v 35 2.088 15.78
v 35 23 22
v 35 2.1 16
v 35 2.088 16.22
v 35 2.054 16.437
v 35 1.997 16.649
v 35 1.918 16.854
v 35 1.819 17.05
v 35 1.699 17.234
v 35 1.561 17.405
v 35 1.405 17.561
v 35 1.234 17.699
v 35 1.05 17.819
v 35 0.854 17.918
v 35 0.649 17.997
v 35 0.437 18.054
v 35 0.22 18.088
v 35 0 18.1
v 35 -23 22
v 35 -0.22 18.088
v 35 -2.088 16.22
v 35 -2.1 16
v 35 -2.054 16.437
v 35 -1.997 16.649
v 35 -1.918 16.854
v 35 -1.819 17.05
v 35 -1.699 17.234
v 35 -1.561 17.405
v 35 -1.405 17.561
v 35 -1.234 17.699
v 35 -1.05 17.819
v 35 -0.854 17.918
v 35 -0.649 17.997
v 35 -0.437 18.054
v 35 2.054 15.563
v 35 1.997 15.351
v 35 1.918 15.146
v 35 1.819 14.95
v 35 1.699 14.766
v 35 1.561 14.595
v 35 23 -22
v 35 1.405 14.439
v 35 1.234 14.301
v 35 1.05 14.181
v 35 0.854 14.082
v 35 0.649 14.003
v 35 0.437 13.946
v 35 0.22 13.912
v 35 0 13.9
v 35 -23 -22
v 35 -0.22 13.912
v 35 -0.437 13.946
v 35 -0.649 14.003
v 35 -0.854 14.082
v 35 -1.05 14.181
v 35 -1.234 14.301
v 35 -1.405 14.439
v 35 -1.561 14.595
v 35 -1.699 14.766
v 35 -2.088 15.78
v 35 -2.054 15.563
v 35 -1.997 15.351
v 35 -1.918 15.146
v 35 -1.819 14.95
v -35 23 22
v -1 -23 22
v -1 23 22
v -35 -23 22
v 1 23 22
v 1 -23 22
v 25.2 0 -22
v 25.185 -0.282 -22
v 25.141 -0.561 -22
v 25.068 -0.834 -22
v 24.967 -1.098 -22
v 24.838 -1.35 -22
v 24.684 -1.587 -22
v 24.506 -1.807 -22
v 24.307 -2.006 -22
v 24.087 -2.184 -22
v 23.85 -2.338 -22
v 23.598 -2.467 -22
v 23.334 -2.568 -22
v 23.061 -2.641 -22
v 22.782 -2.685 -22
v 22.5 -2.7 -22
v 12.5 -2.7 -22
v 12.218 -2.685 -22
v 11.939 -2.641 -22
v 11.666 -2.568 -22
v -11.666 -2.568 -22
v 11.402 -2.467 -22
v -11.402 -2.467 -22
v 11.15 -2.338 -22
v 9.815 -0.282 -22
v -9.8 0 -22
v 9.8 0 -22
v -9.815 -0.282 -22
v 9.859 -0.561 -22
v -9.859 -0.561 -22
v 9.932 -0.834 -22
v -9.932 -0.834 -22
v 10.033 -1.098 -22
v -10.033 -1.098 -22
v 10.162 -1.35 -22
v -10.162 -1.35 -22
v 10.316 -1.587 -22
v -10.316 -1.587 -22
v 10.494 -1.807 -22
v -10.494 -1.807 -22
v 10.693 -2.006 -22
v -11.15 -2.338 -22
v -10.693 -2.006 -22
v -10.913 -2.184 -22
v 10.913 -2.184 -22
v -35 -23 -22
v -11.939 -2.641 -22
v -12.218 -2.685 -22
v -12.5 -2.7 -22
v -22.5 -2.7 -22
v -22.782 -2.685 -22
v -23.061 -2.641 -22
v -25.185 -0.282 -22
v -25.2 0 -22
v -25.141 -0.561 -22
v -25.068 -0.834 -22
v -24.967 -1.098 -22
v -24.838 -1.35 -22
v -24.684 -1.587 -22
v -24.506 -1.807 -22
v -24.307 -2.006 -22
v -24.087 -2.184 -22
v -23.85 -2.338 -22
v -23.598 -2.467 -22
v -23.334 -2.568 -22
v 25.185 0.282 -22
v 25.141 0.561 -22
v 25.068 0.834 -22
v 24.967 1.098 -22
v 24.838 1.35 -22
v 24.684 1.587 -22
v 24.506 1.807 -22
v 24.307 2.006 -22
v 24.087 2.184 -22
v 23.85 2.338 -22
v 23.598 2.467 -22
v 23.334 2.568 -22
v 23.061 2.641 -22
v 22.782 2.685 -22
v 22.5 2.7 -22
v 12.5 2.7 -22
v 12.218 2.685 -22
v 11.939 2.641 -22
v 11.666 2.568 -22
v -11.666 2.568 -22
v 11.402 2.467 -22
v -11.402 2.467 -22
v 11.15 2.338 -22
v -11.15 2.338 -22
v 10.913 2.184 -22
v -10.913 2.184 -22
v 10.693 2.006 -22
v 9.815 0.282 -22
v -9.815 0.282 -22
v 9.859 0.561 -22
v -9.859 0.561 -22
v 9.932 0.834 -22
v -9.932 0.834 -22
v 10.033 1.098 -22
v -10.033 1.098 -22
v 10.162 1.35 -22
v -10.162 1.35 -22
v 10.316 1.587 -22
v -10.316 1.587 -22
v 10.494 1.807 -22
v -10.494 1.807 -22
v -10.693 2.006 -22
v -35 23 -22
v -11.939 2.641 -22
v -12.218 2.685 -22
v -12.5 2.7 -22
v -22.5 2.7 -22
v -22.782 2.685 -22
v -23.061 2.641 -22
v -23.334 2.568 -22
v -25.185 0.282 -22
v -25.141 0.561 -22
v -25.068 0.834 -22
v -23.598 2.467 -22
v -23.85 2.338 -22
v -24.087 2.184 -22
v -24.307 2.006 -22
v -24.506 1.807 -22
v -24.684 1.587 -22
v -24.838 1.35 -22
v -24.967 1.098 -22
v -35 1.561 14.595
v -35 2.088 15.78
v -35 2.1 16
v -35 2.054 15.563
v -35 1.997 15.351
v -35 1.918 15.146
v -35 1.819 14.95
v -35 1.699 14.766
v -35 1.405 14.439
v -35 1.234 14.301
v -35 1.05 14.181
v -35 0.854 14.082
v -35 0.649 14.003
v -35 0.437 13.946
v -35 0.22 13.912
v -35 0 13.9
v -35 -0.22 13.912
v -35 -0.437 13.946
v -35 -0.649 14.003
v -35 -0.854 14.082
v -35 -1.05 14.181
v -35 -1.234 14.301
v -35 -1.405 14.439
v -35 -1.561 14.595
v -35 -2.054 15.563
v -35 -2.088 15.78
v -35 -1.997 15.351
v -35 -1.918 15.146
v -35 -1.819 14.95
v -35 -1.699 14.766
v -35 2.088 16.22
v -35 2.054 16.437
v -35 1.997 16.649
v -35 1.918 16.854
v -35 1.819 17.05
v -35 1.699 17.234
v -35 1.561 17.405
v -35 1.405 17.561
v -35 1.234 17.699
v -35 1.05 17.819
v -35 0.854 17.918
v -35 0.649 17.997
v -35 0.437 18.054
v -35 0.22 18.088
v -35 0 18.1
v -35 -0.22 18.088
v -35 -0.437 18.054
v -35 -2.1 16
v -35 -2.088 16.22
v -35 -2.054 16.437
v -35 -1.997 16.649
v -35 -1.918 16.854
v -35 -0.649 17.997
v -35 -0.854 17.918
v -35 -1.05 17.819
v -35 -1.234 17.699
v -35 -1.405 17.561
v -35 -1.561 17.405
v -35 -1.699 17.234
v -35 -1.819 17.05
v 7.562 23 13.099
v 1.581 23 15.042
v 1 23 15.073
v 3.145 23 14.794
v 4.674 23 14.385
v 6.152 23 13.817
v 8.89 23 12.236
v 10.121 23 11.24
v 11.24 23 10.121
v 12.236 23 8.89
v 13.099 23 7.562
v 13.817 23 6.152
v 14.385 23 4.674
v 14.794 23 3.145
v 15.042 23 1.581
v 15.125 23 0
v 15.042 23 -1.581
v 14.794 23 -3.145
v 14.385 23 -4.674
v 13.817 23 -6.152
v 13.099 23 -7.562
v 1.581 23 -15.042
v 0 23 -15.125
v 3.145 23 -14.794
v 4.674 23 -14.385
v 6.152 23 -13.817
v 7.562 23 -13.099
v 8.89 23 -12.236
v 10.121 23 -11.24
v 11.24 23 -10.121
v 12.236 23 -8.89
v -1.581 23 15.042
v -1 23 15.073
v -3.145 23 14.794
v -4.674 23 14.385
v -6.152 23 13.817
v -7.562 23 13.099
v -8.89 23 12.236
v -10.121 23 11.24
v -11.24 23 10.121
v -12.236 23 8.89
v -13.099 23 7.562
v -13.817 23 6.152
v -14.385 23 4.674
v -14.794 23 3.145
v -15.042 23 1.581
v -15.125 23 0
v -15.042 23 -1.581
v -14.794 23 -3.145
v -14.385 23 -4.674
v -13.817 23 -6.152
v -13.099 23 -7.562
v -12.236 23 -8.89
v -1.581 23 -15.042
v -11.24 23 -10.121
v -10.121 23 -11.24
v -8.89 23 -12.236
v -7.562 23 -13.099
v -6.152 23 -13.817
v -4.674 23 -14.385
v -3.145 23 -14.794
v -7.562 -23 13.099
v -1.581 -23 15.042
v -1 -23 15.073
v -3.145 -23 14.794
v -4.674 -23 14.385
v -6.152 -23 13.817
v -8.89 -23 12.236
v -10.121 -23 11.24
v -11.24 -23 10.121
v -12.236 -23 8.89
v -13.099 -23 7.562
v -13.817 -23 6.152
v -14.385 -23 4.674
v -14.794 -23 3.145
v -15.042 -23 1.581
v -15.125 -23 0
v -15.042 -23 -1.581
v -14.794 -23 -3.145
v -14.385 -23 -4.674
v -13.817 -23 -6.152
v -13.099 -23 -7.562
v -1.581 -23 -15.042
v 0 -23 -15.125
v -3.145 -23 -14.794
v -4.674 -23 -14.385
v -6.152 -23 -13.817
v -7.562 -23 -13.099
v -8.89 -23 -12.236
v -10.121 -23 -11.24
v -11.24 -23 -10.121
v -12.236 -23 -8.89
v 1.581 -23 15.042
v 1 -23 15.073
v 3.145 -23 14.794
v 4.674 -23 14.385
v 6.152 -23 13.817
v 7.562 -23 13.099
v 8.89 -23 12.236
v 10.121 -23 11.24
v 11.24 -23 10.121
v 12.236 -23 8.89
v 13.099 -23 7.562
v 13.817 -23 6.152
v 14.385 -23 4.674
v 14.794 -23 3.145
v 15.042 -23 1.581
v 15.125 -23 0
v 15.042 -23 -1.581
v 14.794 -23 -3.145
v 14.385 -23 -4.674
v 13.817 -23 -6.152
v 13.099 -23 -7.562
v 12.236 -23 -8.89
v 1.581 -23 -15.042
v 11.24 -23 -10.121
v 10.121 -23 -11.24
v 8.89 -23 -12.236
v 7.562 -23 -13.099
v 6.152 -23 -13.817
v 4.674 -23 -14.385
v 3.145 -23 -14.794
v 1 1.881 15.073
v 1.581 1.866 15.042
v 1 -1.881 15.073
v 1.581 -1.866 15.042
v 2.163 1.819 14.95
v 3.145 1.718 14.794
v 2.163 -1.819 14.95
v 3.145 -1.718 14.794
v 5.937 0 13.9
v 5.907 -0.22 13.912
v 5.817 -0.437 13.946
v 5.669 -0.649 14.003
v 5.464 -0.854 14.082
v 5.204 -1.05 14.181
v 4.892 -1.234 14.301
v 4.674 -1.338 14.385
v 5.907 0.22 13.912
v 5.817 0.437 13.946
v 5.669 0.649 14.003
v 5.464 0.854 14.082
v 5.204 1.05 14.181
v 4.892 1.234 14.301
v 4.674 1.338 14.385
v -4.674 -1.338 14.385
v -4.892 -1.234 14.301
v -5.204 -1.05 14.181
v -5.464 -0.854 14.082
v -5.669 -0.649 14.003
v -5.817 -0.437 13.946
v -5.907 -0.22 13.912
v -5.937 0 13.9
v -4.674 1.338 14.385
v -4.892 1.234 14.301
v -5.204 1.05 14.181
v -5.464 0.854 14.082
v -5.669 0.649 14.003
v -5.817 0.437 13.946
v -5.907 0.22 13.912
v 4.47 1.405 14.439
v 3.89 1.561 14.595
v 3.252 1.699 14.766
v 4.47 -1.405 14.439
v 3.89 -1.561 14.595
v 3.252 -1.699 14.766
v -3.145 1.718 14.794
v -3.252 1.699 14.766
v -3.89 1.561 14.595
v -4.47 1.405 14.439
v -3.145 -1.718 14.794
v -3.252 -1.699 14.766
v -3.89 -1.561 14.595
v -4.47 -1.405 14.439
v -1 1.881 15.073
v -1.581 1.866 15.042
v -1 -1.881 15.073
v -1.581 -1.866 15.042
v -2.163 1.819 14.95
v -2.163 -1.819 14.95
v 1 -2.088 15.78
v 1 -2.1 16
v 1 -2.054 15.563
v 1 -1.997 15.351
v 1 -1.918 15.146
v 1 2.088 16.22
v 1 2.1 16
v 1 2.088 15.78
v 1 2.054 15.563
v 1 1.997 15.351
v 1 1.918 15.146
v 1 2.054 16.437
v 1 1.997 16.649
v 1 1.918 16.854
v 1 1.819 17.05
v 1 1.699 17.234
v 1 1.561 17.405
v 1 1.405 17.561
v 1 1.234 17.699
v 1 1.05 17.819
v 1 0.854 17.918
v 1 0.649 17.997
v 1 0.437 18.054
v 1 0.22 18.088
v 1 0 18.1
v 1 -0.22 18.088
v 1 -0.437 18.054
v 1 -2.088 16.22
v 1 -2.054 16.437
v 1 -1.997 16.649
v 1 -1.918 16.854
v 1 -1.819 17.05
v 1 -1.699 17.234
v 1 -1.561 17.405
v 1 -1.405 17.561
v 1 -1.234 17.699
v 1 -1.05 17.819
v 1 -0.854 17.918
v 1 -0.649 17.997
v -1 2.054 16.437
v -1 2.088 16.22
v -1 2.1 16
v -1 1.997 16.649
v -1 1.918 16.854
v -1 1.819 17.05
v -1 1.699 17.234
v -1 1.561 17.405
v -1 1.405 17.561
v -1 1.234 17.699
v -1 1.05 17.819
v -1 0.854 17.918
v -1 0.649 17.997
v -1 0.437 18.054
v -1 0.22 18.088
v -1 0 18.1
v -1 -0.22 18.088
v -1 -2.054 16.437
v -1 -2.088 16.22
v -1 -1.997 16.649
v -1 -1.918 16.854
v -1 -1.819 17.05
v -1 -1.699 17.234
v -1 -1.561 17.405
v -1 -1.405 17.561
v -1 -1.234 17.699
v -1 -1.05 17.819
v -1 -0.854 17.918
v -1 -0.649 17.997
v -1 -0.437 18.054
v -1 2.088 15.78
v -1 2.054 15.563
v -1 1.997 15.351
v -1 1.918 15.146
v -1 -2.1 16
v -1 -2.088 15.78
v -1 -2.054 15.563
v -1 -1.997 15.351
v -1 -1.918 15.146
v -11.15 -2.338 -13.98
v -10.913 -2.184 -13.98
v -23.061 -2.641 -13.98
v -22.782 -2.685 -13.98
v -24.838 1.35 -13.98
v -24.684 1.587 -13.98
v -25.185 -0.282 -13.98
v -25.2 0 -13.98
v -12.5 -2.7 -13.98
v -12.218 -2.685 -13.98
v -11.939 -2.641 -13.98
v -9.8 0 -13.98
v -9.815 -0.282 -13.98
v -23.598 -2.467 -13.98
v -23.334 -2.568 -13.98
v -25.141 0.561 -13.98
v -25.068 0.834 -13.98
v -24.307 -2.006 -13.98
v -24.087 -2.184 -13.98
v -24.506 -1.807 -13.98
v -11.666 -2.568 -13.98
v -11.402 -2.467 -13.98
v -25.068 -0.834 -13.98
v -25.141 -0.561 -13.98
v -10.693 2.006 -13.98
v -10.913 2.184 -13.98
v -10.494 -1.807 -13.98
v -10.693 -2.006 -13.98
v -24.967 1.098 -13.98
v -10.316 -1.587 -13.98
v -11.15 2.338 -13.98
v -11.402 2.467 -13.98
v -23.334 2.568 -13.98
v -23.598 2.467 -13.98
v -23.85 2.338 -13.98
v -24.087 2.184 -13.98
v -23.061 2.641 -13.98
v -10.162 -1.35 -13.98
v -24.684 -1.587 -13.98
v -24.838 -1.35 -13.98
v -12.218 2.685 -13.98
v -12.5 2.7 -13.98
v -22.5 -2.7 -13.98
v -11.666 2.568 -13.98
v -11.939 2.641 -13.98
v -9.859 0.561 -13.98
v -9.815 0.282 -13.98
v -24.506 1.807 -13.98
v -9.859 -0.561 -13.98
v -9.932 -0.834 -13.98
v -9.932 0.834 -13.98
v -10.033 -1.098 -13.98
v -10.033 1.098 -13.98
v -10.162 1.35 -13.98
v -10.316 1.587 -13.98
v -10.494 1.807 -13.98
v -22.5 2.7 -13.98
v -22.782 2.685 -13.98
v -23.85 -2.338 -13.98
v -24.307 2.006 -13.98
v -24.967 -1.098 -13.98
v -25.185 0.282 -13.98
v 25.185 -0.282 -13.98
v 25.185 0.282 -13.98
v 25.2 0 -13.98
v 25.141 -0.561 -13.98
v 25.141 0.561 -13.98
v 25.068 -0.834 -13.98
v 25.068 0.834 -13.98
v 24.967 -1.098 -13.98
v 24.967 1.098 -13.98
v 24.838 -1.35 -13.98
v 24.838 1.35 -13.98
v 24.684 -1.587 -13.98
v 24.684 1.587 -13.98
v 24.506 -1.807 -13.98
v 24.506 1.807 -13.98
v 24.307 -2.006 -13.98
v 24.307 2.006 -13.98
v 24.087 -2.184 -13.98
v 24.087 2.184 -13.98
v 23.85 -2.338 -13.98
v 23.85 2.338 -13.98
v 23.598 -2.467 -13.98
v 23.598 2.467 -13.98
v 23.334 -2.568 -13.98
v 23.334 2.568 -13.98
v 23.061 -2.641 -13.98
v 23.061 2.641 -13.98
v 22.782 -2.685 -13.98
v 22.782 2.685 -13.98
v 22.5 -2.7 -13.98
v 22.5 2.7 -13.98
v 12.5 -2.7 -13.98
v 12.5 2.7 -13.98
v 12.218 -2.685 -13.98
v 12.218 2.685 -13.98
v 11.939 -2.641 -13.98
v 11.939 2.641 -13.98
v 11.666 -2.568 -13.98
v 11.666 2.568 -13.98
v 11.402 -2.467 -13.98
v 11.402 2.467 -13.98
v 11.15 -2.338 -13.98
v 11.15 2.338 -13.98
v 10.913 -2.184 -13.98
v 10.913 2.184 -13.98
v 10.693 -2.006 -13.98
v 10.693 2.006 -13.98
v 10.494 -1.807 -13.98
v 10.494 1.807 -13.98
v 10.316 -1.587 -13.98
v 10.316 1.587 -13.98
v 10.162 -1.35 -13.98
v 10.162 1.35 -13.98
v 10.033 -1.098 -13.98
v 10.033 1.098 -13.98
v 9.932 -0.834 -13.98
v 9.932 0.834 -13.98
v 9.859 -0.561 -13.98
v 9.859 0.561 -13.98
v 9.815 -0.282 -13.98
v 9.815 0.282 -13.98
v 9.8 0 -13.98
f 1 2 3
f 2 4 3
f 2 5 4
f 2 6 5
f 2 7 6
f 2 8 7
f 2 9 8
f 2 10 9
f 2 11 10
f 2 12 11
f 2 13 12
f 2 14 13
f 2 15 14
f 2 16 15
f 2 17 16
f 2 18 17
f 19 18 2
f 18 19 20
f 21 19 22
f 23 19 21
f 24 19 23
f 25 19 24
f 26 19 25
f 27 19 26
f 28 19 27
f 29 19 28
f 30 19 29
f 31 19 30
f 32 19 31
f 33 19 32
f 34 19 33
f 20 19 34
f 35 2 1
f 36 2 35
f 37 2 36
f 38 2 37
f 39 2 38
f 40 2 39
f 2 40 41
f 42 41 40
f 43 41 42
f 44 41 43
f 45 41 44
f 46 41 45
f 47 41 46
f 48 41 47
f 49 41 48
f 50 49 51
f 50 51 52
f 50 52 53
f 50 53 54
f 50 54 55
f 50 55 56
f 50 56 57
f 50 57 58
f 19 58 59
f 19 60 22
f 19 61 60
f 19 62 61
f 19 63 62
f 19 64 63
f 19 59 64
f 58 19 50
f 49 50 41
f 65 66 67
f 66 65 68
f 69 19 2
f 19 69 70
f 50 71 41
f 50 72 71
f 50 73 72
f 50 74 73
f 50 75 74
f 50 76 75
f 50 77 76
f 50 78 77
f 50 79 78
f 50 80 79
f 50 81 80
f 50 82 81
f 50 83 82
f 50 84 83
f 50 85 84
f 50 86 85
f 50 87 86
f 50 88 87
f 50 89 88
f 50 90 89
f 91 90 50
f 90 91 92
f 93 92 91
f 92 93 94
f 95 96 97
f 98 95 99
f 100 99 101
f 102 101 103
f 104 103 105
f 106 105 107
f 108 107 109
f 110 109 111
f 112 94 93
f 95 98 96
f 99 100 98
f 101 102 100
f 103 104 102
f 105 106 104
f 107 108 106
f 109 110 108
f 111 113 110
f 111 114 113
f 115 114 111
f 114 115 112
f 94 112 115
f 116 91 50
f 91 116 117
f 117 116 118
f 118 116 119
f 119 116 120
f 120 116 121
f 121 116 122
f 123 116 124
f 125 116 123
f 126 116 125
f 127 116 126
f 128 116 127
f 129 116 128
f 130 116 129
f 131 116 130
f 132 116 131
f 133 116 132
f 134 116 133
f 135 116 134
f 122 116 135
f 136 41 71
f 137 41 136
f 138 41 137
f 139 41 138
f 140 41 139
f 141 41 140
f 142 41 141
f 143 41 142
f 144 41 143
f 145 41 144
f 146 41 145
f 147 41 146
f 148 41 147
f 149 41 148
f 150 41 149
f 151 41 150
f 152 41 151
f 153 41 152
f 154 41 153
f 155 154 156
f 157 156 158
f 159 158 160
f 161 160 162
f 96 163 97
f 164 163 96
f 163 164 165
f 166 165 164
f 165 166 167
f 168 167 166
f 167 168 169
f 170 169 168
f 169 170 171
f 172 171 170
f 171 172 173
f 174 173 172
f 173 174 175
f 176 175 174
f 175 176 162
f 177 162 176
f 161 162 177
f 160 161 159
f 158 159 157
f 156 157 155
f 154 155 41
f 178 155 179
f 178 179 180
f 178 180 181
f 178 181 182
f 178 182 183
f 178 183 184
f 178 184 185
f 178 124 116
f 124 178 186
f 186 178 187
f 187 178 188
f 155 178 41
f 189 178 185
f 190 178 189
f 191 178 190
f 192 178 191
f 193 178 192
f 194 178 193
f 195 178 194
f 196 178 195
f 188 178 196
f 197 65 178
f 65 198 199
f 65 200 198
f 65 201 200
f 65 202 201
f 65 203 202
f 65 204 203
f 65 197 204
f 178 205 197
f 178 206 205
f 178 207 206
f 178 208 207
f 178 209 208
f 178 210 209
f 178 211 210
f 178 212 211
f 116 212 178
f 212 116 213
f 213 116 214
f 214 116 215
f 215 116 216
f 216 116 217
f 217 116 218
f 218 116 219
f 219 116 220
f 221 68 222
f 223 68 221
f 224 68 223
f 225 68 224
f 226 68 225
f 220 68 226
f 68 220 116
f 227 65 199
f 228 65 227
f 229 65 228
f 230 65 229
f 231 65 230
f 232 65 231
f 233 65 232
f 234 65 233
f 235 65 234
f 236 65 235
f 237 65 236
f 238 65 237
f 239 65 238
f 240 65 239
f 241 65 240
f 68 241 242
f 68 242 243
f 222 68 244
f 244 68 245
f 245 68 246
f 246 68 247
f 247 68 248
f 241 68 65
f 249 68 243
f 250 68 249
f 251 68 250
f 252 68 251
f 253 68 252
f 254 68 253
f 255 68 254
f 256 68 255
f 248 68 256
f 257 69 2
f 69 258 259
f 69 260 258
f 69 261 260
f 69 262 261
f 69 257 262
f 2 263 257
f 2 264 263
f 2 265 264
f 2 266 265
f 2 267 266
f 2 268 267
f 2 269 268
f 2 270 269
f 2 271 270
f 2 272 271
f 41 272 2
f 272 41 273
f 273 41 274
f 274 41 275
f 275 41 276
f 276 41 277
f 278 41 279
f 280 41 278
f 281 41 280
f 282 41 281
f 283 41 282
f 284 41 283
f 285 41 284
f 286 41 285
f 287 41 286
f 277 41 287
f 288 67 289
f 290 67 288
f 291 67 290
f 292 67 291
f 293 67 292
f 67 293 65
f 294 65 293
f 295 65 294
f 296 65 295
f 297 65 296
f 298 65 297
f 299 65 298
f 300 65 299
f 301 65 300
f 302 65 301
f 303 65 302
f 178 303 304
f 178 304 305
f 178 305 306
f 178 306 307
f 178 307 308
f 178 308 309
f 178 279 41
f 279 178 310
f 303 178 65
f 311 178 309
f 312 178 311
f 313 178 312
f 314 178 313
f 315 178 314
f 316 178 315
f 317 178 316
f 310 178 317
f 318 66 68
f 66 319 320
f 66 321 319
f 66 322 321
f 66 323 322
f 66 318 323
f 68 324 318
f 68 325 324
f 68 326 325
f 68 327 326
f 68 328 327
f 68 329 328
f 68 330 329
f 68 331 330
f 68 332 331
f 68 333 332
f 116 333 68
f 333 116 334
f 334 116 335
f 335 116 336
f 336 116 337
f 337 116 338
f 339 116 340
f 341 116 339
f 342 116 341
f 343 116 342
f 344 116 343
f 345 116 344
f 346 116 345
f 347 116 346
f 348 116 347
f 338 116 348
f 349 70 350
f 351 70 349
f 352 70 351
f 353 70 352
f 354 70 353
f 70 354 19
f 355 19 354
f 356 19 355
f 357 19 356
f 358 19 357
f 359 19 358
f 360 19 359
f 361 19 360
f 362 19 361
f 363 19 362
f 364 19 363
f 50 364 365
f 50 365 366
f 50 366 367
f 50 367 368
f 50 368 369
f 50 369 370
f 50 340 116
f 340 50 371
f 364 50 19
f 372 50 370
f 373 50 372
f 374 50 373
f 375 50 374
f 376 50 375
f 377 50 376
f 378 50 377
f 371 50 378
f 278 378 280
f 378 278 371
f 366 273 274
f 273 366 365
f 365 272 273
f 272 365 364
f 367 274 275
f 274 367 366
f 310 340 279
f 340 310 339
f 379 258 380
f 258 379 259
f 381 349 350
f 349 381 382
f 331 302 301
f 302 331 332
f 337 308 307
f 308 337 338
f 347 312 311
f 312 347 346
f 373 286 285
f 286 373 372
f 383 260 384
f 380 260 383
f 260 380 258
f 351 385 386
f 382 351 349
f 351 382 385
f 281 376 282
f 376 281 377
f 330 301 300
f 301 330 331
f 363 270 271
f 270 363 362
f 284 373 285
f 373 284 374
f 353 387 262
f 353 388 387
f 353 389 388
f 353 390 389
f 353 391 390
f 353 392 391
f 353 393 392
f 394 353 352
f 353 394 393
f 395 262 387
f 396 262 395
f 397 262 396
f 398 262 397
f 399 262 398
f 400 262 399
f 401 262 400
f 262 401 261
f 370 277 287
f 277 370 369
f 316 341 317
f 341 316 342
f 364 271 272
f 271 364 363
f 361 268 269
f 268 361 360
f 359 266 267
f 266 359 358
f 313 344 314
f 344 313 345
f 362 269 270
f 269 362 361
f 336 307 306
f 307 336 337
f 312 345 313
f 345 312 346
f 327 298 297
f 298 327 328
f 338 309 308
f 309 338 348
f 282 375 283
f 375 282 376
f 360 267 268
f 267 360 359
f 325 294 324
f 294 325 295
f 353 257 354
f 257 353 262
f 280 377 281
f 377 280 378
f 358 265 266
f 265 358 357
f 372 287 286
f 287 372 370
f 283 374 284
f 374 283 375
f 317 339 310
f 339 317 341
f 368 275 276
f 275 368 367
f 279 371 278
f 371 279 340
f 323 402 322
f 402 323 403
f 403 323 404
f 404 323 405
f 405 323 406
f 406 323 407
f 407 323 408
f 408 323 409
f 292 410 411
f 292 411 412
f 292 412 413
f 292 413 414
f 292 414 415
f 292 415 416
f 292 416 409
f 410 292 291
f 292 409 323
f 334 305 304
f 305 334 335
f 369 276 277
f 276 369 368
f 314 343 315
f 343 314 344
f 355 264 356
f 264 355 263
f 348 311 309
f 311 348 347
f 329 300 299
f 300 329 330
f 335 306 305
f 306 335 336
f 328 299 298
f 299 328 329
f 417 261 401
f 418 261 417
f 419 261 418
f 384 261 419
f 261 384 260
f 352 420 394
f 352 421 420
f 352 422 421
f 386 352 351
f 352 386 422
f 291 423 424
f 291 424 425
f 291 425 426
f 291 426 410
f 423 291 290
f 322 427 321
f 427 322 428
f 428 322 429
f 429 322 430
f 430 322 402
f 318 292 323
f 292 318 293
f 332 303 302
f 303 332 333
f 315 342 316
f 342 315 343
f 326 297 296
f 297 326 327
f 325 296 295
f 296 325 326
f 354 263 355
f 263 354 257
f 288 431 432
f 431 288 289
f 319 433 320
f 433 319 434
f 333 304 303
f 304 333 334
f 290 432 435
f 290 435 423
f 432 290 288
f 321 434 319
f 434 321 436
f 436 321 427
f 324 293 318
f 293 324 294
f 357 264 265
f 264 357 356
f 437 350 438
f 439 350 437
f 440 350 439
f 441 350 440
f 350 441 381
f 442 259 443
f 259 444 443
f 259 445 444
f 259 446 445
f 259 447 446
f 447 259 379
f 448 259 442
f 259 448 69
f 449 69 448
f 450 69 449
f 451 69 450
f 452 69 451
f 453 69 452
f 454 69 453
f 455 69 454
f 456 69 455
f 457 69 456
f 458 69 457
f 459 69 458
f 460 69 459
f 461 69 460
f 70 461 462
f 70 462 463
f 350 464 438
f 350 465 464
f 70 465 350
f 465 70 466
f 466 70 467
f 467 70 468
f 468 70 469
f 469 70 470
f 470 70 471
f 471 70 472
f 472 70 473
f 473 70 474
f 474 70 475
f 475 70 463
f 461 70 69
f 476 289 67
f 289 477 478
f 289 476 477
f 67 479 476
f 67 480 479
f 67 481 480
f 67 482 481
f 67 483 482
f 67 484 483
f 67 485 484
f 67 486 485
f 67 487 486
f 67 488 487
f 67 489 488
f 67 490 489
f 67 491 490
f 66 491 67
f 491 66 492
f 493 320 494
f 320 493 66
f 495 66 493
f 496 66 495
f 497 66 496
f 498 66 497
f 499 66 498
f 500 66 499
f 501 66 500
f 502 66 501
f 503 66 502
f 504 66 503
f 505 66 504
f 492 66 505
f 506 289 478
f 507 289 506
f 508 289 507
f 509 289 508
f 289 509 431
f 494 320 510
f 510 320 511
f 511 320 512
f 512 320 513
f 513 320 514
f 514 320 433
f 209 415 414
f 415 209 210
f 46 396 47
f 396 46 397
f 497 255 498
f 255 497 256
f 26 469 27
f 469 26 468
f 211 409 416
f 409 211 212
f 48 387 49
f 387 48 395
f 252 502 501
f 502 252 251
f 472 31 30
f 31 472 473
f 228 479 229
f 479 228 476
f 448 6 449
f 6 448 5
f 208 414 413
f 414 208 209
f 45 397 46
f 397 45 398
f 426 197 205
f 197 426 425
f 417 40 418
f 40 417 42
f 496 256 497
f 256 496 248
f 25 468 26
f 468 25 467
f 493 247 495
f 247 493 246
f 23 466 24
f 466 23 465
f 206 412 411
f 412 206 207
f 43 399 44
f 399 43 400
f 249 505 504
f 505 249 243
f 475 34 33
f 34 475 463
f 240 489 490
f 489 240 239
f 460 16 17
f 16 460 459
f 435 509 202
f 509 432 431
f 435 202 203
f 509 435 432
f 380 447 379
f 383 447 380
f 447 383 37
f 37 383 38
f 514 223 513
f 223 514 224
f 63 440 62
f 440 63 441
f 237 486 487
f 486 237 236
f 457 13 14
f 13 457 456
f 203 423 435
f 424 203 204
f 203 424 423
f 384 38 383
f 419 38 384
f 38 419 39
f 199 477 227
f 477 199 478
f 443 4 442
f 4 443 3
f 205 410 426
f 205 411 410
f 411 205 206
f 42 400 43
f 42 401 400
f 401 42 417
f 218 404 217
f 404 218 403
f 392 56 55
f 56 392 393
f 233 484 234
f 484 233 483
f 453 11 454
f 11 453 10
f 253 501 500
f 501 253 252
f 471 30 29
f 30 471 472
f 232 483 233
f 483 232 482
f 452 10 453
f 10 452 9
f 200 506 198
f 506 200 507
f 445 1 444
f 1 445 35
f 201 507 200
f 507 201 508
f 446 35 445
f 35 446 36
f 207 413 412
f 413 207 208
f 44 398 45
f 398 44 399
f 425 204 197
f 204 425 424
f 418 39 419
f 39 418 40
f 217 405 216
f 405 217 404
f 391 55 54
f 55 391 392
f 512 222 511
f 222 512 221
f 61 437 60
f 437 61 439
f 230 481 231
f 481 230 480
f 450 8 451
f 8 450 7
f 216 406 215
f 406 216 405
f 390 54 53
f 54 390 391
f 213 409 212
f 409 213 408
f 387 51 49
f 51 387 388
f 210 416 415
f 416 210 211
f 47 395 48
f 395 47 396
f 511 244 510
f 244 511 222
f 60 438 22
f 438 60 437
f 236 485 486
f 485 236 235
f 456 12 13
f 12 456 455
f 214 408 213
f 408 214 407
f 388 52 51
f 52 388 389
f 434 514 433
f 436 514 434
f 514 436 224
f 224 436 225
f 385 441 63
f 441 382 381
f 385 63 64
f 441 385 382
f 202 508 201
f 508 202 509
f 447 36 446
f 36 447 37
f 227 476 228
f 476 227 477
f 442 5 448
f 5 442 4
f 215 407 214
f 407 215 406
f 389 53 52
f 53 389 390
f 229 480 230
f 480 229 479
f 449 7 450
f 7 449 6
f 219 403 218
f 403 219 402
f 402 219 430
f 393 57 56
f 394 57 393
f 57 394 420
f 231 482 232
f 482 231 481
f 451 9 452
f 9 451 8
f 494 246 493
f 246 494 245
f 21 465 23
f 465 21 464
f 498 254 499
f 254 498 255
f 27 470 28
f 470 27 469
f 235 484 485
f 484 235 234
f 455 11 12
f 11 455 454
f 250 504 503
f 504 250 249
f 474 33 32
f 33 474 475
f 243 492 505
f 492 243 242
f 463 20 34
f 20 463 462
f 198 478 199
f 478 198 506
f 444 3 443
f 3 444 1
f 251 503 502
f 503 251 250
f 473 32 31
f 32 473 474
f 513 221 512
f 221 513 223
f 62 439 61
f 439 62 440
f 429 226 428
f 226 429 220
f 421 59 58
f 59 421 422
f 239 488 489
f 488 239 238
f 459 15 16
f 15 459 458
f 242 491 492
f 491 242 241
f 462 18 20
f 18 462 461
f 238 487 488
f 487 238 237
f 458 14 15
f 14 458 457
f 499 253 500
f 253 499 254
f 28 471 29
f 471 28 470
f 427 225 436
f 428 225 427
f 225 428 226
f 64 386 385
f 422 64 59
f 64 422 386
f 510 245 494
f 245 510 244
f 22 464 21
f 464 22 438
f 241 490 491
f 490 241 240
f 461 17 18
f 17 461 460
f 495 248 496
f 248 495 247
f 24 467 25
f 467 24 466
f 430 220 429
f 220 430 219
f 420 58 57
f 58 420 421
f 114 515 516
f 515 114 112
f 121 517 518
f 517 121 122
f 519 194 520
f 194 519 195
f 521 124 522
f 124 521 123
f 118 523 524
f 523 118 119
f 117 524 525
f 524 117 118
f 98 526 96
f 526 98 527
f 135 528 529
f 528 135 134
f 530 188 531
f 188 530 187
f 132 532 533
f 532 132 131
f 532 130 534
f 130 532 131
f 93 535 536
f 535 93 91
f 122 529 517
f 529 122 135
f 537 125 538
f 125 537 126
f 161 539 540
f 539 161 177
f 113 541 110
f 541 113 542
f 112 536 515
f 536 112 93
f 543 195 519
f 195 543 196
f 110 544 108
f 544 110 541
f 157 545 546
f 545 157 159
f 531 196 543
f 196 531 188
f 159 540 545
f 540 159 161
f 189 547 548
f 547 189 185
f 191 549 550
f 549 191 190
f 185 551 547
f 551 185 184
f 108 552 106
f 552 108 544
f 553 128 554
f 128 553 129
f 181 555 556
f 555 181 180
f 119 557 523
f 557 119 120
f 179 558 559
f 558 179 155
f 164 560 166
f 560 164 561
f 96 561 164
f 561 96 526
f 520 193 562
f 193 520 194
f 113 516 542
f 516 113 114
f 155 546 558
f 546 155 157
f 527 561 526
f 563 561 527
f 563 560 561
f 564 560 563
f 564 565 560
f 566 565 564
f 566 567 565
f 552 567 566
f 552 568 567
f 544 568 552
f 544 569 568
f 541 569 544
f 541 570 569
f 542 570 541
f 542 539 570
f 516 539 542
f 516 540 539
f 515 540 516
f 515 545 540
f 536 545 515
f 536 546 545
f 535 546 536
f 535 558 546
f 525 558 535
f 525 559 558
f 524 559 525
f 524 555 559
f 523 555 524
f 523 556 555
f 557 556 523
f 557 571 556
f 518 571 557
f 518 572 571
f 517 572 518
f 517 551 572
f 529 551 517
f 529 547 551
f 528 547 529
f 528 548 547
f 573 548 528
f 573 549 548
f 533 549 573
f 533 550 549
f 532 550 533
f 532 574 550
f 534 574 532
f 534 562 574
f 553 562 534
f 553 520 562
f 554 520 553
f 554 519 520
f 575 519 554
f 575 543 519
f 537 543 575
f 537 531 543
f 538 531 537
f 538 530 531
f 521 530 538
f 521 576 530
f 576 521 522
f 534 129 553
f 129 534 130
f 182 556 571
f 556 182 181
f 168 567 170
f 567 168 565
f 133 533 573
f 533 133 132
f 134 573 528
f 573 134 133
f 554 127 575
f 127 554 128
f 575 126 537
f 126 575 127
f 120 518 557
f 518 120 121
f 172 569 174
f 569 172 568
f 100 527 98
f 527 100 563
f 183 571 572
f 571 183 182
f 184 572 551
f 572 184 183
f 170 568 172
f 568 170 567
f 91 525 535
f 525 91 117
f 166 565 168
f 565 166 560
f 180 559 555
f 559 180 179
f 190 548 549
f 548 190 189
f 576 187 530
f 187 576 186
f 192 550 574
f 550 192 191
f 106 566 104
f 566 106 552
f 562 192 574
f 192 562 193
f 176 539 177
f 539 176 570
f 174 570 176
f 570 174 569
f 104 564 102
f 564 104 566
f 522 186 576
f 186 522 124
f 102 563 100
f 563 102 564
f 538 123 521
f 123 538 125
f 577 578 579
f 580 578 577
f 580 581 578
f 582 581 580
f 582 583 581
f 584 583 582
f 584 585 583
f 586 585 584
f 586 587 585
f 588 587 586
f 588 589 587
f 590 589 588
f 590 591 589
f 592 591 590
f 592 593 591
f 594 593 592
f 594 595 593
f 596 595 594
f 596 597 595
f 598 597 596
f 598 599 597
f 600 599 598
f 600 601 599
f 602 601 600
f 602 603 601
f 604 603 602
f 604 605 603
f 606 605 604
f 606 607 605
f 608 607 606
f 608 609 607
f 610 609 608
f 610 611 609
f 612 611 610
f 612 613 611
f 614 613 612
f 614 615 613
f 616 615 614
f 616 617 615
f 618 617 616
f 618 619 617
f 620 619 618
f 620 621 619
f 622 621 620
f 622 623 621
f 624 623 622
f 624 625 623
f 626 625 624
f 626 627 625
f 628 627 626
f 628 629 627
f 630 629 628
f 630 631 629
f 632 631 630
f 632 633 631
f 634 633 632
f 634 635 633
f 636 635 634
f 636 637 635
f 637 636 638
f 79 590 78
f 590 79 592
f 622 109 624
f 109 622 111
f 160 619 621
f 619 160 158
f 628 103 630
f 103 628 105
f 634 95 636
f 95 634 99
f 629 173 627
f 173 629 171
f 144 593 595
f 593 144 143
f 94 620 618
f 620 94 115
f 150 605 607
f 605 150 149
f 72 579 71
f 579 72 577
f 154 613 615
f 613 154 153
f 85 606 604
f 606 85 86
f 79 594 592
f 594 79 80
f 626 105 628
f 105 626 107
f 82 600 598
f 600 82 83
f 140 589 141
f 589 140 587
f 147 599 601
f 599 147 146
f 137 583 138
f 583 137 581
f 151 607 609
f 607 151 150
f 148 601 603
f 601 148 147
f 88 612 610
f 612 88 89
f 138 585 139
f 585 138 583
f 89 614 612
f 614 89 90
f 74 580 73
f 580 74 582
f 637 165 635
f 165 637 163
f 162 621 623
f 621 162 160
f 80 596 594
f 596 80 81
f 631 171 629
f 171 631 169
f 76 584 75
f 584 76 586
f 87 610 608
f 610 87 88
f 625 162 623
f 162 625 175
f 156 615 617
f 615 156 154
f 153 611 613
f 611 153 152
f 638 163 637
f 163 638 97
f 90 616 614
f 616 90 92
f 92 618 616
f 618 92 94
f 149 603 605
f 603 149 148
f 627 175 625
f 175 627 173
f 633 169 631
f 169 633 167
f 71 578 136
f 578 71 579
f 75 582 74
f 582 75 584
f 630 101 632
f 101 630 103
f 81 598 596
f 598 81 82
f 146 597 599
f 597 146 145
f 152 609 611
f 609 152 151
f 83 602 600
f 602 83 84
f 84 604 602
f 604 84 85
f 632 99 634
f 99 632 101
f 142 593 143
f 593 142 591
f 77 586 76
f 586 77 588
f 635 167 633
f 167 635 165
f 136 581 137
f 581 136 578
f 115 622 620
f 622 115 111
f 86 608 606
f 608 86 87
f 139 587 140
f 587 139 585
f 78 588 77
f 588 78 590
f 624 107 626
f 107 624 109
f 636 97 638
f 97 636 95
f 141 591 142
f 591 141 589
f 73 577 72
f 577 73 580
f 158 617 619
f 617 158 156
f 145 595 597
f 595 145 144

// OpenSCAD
// Split housing for 30 mm OD linear bearing.
$fn = 60;
eps = 0.02;
bearing_d = 30;
body_l = 70;
body_d = 46;
body_h = 44;
slot_w = 2;
module mount_slot(x) {
    hull() {
        translate([x - 5, 0, -body_h / 2 - eps]) cylinder(d = 5.4, h = 8 + 2 * eps);
        translate([x + 5, 0, -body_h / 2 - eps]) cylinder(d = 5.4, h = 8 + 2 * eps);
    }
}
difference() {
    cube([body_l, body_d, body_h], center = true);
    translate([0, -body_d / 2 - eps, 0]) rotate([-90, 0, 0]) cylinder(d = bearing_d + 0.25, h = body_d + 2 * eps);
    translate([-slot_w / 2, -body_d / 2 - eps, 0]) cube([slot_w, body_d + 2 * eps, body_h / 2 + eps]);
    translate([-body_l / 2 - eps, 0, body_h / 2 - 6]) rotate([0, 90, 0]) cylinder(d = 4.2, h = body_l + 2 * eps);
    mount_slot(-body_l / 4);
    mount_slot(body_l / 4);
}
